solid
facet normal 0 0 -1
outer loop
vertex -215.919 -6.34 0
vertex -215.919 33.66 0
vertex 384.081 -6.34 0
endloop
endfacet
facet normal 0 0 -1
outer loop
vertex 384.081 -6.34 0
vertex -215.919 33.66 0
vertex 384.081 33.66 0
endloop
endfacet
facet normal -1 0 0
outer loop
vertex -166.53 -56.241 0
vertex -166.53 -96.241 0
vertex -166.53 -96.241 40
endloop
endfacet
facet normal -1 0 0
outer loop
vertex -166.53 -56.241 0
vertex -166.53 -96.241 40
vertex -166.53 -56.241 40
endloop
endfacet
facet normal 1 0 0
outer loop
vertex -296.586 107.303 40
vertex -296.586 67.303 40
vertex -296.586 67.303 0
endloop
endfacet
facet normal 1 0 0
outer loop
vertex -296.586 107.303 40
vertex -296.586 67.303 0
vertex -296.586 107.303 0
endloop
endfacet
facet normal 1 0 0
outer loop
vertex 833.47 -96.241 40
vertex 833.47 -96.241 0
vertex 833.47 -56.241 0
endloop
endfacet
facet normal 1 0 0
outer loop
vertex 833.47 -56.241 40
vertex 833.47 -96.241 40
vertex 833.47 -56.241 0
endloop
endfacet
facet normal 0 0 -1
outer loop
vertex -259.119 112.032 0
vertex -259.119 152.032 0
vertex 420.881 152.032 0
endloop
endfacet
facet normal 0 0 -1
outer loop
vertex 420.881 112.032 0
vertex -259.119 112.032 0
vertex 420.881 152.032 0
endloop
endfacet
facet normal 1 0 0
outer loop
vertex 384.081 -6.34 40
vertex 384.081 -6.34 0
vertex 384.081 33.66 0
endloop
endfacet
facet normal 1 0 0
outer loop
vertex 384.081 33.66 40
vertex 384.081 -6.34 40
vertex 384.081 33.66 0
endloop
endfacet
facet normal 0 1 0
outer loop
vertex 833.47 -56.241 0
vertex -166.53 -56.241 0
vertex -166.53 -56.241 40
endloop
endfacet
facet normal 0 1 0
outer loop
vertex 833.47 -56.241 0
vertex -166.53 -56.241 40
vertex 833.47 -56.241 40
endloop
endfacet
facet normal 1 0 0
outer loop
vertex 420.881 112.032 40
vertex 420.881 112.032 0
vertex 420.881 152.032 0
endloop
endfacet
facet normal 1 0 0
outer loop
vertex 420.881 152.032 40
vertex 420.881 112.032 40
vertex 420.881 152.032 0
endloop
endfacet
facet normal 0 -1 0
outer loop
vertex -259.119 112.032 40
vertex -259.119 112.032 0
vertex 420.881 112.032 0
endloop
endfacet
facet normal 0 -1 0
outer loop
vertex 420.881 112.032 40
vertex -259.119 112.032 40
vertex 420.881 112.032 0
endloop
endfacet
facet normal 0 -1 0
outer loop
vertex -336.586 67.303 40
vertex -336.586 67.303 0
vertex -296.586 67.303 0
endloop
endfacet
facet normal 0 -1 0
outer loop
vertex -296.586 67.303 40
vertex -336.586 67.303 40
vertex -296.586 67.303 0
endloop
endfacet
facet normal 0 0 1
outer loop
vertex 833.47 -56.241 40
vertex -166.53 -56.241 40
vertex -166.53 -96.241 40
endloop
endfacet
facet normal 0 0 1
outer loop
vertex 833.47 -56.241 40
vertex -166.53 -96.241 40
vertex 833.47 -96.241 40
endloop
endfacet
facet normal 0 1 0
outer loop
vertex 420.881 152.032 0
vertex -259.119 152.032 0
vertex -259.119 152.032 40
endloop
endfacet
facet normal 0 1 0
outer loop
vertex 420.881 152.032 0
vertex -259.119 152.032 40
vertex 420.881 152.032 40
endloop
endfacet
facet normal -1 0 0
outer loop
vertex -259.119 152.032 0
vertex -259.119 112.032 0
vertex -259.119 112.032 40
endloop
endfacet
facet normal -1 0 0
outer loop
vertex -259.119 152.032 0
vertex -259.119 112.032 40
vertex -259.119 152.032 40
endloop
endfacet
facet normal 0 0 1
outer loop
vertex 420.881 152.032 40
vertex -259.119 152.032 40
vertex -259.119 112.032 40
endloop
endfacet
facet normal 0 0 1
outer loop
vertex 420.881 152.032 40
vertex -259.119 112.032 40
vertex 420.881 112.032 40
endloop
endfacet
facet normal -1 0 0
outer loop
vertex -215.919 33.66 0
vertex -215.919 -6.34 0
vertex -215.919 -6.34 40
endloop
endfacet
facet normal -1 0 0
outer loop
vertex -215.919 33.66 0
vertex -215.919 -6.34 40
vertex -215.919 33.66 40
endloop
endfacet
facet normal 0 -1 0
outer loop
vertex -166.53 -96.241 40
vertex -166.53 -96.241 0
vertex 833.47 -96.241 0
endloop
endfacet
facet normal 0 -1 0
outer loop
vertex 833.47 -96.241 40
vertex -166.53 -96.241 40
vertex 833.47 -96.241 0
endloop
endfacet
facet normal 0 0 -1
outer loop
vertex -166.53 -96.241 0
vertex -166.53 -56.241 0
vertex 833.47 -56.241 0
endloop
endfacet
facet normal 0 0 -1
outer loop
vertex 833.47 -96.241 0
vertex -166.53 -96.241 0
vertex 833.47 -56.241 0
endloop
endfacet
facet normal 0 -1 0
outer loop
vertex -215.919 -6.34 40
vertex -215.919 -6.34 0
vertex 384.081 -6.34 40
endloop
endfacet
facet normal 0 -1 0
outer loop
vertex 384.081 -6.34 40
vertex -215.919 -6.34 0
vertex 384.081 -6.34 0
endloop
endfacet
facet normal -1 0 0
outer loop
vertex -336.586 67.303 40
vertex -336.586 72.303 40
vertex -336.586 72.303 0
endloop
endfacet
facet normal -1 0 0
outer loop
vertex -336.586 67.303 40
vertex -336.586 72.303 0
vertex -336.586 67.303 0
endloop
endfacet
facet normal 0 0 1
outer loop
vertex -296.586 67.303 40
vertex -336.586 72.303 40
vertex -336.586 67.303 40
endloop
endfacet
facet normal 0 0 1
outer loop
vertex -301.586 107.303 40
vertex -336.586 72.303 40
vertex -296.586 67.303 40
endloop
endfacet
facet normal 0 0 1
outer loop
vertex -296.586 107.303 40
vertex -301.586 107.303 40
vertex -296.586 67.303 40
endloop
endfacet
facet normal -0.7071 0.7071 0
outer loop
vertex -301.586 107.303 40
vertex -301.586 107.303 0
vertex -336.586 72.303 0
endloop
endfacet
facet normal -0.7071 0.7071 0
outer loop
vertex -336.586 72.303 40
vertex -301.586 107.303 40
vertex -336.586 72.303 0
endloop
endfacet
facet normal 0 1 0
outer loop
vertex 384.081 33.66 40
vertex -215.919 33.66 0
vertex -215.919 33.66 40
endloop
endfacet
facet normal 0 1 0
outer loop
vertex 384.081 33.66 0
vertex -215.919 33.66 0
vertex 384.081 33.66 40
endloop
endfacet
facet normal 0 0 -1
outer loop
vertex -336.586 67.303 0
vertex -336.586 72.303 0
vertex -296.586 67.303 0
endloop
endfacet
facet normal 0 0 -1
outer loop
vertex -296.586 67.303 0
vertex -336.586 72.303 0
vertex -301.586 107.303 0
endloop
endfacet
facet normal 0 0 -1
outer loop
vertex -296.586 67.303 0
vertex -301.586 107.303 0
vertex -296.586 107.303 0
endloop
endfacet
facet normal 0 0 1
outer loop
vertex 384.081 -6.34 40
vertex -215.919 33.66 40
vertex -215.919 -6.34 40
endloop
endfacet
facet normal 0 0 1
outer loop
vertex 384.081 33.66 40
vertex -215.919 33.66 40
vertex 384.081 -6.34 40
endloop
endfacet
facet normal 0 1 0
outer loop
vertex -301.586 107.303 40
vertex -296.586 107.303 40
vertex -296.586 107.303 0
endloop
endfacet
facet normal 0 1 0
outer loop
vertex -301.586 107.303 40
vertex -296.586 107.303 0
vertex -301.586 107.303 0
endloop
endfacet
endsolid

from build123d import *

# Parameters (mm, degrees)
F0_W     = 600
F0_H     = 40
F1_DEPTH = 40
F2_W     = 1000
F2_H     = 40
F3_DEPTH = 40
F5_DEPTH = 40
F6_W     = 680
F6_H     = 40
F7_DEPTH = 40


with BuildPart() as f1:
    # F0 (on Top) → F1 (new body)
    with BuildSketch(Plane.XY):
        with Locations((84.080714, 13.660387)):
            Rectangle(F0_W, F0_H)
    extrude(amount=F1_DEPTH)


with BuildPart() as f3:
    # F2 (on Top) → F3 (new body)
    with BuildSketch(Plane.XY):
        with Locations((333.469917, -76.240545)):
            Rectangle(F2_W, F2_H)
    extrude(amount=F3_DEPTH)


with BuildPart() as f5:
    # F4 (on Top) → F5 (new body)
    with BuildSketch(Plane.XY):
        Polygon((-296.585902, 107.303303), (-336.585902, 67.303303), (-296.585902, 67.303303), align=None)
        Polygon((-336.585902, 72.303303), (-336.585902, 67.303303), (-296.585902, 107.303303), (-301.585902, 107.303303), align=None)
    extrude(amount=F5_DEPTH)


with BuildPart() as f7:
    # F6 (on Top) → F7 (new body)
    with BuildSketch(Plane.XY):
        with Locations((80.881054, 132.032394)):
            Rectangle(F6_W, F6_H)
    extrude(amount=F7_DEPTH)


solid = Compound([f1.part, f3.part, f5.part, f7.part])
